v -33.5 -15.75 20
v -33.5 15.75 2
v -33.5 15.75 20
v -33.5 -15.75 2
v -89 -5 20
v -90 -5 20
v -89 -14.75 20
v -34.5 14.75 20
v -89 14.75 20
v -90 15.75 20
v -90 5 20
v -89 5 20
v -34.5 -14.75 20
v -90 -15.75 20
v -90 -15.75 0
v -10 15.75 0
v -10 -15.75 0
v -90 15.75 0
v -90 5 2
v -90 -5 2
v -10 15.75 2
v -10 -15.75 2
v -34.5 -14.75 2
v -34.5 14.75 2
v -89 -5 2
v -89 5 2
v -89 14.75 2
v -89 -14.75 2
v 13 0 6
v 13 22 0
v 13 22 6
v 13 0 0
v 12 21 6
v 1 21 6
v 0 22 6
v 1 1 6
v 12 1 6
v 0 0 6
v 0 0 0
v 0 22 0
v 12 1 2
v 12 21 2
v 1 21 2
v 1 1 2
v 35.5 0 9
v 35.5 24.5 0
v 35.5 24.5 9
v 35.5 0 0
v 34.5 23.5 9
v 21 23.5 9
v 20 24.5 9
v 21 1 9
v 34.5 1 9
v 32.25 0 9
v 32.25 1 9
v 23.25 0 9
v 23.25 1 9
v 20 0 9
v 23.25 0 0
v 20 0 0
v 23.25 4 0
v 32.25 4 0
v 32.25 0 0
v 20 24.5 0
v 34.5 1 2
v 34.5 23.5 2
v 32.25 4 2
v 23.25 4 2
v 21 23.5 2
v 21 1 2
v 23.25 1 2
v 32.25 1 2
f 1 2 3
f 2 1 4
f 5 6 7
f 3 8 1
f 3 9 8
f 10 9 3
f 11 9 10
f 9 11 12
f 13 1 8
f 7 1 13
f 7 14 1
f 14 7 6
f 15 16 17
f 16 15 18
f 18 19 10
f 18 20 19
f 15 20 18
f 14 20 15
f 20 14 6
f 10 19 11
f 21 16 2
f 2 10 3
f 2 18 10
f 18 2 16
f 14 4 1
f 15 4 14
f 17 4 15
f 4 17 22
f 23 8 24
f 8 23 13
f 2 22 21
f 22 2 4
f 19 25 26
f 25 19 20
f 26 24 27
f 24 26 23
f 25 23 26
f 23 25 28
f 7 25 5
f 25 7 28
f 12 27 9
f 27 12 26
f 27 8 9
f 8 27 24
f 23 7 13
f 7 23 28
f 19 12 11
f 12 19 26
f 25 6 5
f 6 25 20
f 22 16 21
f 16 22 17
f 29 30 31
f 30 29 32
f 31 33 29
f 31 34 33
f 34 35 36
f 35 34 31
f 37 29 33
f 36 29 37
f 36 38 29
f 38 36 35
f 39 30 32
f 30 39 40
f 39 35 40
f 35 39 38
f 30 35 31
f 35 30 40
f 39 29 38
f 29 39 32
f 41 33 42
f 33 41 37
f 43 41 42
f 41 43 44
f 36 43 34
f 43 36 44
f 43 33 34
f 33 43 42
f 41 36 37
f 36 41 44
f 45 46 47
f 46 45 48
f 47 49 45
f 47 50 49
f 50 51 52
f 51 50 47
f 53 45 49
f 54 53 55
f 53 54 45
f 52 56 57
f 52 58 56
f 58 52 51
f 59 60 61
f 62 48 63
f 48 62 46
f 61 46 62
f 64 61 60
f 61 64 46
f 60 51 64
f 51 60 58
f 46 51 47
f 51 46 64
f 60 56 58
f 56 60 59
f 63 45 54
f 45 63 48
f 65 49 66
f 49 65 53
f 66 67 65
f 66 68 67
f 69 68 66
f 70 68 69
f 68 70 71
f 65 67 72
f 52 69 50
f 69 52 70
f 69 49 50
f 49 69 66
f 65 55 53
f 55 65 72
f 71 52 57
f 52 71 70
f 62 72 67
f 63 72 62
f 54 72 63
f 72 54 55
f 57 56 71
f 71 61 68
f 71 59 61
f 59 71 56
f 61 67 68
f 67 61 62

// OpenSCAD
$fn=50;

// translate([-27, -14.5])
//     difference() {
//         cube([54, 29, 10]);

//         translate([1, 1, 2]) 
//             cube([52, 27, 10]);
//     }




// translate([-52.5, 0, 0]) 
//     difference() {
//         cube([105, 10, 2]);

//     translate([6, 5, -1]) {
//         cylinder(5, 1.6,  1.6);

//         translate([93, 0, 0])
//             cylinder(5, 1.6,  1.6);
//         }
//     }


translate([-90, -15.75]) {
    cube([80, 31.5, 2]);

    difference() {
        cube([56.5, 31.5, 20]);

        translate([1, 1, 2]) 
            cube([54.5, 29.5, 20]);

        translate([-4,  10.75, -0.1]) 
            cube([10, 10, 22]);
    }

}

difference() {
    cube([13, 22, 6]);

    translate([1, 1, 2])
        cube([11, 20, 7.1]);
}


translate([20, 0, 0])
    difference() {
        cube([15.5, 24.5, 9]);

        translate([1, 1, 2])
            cube([13.5, 22.5, 9.1]);

        translate([3.25, -1, -0.1])
            cube([9, 5, 9.2]);

    }
